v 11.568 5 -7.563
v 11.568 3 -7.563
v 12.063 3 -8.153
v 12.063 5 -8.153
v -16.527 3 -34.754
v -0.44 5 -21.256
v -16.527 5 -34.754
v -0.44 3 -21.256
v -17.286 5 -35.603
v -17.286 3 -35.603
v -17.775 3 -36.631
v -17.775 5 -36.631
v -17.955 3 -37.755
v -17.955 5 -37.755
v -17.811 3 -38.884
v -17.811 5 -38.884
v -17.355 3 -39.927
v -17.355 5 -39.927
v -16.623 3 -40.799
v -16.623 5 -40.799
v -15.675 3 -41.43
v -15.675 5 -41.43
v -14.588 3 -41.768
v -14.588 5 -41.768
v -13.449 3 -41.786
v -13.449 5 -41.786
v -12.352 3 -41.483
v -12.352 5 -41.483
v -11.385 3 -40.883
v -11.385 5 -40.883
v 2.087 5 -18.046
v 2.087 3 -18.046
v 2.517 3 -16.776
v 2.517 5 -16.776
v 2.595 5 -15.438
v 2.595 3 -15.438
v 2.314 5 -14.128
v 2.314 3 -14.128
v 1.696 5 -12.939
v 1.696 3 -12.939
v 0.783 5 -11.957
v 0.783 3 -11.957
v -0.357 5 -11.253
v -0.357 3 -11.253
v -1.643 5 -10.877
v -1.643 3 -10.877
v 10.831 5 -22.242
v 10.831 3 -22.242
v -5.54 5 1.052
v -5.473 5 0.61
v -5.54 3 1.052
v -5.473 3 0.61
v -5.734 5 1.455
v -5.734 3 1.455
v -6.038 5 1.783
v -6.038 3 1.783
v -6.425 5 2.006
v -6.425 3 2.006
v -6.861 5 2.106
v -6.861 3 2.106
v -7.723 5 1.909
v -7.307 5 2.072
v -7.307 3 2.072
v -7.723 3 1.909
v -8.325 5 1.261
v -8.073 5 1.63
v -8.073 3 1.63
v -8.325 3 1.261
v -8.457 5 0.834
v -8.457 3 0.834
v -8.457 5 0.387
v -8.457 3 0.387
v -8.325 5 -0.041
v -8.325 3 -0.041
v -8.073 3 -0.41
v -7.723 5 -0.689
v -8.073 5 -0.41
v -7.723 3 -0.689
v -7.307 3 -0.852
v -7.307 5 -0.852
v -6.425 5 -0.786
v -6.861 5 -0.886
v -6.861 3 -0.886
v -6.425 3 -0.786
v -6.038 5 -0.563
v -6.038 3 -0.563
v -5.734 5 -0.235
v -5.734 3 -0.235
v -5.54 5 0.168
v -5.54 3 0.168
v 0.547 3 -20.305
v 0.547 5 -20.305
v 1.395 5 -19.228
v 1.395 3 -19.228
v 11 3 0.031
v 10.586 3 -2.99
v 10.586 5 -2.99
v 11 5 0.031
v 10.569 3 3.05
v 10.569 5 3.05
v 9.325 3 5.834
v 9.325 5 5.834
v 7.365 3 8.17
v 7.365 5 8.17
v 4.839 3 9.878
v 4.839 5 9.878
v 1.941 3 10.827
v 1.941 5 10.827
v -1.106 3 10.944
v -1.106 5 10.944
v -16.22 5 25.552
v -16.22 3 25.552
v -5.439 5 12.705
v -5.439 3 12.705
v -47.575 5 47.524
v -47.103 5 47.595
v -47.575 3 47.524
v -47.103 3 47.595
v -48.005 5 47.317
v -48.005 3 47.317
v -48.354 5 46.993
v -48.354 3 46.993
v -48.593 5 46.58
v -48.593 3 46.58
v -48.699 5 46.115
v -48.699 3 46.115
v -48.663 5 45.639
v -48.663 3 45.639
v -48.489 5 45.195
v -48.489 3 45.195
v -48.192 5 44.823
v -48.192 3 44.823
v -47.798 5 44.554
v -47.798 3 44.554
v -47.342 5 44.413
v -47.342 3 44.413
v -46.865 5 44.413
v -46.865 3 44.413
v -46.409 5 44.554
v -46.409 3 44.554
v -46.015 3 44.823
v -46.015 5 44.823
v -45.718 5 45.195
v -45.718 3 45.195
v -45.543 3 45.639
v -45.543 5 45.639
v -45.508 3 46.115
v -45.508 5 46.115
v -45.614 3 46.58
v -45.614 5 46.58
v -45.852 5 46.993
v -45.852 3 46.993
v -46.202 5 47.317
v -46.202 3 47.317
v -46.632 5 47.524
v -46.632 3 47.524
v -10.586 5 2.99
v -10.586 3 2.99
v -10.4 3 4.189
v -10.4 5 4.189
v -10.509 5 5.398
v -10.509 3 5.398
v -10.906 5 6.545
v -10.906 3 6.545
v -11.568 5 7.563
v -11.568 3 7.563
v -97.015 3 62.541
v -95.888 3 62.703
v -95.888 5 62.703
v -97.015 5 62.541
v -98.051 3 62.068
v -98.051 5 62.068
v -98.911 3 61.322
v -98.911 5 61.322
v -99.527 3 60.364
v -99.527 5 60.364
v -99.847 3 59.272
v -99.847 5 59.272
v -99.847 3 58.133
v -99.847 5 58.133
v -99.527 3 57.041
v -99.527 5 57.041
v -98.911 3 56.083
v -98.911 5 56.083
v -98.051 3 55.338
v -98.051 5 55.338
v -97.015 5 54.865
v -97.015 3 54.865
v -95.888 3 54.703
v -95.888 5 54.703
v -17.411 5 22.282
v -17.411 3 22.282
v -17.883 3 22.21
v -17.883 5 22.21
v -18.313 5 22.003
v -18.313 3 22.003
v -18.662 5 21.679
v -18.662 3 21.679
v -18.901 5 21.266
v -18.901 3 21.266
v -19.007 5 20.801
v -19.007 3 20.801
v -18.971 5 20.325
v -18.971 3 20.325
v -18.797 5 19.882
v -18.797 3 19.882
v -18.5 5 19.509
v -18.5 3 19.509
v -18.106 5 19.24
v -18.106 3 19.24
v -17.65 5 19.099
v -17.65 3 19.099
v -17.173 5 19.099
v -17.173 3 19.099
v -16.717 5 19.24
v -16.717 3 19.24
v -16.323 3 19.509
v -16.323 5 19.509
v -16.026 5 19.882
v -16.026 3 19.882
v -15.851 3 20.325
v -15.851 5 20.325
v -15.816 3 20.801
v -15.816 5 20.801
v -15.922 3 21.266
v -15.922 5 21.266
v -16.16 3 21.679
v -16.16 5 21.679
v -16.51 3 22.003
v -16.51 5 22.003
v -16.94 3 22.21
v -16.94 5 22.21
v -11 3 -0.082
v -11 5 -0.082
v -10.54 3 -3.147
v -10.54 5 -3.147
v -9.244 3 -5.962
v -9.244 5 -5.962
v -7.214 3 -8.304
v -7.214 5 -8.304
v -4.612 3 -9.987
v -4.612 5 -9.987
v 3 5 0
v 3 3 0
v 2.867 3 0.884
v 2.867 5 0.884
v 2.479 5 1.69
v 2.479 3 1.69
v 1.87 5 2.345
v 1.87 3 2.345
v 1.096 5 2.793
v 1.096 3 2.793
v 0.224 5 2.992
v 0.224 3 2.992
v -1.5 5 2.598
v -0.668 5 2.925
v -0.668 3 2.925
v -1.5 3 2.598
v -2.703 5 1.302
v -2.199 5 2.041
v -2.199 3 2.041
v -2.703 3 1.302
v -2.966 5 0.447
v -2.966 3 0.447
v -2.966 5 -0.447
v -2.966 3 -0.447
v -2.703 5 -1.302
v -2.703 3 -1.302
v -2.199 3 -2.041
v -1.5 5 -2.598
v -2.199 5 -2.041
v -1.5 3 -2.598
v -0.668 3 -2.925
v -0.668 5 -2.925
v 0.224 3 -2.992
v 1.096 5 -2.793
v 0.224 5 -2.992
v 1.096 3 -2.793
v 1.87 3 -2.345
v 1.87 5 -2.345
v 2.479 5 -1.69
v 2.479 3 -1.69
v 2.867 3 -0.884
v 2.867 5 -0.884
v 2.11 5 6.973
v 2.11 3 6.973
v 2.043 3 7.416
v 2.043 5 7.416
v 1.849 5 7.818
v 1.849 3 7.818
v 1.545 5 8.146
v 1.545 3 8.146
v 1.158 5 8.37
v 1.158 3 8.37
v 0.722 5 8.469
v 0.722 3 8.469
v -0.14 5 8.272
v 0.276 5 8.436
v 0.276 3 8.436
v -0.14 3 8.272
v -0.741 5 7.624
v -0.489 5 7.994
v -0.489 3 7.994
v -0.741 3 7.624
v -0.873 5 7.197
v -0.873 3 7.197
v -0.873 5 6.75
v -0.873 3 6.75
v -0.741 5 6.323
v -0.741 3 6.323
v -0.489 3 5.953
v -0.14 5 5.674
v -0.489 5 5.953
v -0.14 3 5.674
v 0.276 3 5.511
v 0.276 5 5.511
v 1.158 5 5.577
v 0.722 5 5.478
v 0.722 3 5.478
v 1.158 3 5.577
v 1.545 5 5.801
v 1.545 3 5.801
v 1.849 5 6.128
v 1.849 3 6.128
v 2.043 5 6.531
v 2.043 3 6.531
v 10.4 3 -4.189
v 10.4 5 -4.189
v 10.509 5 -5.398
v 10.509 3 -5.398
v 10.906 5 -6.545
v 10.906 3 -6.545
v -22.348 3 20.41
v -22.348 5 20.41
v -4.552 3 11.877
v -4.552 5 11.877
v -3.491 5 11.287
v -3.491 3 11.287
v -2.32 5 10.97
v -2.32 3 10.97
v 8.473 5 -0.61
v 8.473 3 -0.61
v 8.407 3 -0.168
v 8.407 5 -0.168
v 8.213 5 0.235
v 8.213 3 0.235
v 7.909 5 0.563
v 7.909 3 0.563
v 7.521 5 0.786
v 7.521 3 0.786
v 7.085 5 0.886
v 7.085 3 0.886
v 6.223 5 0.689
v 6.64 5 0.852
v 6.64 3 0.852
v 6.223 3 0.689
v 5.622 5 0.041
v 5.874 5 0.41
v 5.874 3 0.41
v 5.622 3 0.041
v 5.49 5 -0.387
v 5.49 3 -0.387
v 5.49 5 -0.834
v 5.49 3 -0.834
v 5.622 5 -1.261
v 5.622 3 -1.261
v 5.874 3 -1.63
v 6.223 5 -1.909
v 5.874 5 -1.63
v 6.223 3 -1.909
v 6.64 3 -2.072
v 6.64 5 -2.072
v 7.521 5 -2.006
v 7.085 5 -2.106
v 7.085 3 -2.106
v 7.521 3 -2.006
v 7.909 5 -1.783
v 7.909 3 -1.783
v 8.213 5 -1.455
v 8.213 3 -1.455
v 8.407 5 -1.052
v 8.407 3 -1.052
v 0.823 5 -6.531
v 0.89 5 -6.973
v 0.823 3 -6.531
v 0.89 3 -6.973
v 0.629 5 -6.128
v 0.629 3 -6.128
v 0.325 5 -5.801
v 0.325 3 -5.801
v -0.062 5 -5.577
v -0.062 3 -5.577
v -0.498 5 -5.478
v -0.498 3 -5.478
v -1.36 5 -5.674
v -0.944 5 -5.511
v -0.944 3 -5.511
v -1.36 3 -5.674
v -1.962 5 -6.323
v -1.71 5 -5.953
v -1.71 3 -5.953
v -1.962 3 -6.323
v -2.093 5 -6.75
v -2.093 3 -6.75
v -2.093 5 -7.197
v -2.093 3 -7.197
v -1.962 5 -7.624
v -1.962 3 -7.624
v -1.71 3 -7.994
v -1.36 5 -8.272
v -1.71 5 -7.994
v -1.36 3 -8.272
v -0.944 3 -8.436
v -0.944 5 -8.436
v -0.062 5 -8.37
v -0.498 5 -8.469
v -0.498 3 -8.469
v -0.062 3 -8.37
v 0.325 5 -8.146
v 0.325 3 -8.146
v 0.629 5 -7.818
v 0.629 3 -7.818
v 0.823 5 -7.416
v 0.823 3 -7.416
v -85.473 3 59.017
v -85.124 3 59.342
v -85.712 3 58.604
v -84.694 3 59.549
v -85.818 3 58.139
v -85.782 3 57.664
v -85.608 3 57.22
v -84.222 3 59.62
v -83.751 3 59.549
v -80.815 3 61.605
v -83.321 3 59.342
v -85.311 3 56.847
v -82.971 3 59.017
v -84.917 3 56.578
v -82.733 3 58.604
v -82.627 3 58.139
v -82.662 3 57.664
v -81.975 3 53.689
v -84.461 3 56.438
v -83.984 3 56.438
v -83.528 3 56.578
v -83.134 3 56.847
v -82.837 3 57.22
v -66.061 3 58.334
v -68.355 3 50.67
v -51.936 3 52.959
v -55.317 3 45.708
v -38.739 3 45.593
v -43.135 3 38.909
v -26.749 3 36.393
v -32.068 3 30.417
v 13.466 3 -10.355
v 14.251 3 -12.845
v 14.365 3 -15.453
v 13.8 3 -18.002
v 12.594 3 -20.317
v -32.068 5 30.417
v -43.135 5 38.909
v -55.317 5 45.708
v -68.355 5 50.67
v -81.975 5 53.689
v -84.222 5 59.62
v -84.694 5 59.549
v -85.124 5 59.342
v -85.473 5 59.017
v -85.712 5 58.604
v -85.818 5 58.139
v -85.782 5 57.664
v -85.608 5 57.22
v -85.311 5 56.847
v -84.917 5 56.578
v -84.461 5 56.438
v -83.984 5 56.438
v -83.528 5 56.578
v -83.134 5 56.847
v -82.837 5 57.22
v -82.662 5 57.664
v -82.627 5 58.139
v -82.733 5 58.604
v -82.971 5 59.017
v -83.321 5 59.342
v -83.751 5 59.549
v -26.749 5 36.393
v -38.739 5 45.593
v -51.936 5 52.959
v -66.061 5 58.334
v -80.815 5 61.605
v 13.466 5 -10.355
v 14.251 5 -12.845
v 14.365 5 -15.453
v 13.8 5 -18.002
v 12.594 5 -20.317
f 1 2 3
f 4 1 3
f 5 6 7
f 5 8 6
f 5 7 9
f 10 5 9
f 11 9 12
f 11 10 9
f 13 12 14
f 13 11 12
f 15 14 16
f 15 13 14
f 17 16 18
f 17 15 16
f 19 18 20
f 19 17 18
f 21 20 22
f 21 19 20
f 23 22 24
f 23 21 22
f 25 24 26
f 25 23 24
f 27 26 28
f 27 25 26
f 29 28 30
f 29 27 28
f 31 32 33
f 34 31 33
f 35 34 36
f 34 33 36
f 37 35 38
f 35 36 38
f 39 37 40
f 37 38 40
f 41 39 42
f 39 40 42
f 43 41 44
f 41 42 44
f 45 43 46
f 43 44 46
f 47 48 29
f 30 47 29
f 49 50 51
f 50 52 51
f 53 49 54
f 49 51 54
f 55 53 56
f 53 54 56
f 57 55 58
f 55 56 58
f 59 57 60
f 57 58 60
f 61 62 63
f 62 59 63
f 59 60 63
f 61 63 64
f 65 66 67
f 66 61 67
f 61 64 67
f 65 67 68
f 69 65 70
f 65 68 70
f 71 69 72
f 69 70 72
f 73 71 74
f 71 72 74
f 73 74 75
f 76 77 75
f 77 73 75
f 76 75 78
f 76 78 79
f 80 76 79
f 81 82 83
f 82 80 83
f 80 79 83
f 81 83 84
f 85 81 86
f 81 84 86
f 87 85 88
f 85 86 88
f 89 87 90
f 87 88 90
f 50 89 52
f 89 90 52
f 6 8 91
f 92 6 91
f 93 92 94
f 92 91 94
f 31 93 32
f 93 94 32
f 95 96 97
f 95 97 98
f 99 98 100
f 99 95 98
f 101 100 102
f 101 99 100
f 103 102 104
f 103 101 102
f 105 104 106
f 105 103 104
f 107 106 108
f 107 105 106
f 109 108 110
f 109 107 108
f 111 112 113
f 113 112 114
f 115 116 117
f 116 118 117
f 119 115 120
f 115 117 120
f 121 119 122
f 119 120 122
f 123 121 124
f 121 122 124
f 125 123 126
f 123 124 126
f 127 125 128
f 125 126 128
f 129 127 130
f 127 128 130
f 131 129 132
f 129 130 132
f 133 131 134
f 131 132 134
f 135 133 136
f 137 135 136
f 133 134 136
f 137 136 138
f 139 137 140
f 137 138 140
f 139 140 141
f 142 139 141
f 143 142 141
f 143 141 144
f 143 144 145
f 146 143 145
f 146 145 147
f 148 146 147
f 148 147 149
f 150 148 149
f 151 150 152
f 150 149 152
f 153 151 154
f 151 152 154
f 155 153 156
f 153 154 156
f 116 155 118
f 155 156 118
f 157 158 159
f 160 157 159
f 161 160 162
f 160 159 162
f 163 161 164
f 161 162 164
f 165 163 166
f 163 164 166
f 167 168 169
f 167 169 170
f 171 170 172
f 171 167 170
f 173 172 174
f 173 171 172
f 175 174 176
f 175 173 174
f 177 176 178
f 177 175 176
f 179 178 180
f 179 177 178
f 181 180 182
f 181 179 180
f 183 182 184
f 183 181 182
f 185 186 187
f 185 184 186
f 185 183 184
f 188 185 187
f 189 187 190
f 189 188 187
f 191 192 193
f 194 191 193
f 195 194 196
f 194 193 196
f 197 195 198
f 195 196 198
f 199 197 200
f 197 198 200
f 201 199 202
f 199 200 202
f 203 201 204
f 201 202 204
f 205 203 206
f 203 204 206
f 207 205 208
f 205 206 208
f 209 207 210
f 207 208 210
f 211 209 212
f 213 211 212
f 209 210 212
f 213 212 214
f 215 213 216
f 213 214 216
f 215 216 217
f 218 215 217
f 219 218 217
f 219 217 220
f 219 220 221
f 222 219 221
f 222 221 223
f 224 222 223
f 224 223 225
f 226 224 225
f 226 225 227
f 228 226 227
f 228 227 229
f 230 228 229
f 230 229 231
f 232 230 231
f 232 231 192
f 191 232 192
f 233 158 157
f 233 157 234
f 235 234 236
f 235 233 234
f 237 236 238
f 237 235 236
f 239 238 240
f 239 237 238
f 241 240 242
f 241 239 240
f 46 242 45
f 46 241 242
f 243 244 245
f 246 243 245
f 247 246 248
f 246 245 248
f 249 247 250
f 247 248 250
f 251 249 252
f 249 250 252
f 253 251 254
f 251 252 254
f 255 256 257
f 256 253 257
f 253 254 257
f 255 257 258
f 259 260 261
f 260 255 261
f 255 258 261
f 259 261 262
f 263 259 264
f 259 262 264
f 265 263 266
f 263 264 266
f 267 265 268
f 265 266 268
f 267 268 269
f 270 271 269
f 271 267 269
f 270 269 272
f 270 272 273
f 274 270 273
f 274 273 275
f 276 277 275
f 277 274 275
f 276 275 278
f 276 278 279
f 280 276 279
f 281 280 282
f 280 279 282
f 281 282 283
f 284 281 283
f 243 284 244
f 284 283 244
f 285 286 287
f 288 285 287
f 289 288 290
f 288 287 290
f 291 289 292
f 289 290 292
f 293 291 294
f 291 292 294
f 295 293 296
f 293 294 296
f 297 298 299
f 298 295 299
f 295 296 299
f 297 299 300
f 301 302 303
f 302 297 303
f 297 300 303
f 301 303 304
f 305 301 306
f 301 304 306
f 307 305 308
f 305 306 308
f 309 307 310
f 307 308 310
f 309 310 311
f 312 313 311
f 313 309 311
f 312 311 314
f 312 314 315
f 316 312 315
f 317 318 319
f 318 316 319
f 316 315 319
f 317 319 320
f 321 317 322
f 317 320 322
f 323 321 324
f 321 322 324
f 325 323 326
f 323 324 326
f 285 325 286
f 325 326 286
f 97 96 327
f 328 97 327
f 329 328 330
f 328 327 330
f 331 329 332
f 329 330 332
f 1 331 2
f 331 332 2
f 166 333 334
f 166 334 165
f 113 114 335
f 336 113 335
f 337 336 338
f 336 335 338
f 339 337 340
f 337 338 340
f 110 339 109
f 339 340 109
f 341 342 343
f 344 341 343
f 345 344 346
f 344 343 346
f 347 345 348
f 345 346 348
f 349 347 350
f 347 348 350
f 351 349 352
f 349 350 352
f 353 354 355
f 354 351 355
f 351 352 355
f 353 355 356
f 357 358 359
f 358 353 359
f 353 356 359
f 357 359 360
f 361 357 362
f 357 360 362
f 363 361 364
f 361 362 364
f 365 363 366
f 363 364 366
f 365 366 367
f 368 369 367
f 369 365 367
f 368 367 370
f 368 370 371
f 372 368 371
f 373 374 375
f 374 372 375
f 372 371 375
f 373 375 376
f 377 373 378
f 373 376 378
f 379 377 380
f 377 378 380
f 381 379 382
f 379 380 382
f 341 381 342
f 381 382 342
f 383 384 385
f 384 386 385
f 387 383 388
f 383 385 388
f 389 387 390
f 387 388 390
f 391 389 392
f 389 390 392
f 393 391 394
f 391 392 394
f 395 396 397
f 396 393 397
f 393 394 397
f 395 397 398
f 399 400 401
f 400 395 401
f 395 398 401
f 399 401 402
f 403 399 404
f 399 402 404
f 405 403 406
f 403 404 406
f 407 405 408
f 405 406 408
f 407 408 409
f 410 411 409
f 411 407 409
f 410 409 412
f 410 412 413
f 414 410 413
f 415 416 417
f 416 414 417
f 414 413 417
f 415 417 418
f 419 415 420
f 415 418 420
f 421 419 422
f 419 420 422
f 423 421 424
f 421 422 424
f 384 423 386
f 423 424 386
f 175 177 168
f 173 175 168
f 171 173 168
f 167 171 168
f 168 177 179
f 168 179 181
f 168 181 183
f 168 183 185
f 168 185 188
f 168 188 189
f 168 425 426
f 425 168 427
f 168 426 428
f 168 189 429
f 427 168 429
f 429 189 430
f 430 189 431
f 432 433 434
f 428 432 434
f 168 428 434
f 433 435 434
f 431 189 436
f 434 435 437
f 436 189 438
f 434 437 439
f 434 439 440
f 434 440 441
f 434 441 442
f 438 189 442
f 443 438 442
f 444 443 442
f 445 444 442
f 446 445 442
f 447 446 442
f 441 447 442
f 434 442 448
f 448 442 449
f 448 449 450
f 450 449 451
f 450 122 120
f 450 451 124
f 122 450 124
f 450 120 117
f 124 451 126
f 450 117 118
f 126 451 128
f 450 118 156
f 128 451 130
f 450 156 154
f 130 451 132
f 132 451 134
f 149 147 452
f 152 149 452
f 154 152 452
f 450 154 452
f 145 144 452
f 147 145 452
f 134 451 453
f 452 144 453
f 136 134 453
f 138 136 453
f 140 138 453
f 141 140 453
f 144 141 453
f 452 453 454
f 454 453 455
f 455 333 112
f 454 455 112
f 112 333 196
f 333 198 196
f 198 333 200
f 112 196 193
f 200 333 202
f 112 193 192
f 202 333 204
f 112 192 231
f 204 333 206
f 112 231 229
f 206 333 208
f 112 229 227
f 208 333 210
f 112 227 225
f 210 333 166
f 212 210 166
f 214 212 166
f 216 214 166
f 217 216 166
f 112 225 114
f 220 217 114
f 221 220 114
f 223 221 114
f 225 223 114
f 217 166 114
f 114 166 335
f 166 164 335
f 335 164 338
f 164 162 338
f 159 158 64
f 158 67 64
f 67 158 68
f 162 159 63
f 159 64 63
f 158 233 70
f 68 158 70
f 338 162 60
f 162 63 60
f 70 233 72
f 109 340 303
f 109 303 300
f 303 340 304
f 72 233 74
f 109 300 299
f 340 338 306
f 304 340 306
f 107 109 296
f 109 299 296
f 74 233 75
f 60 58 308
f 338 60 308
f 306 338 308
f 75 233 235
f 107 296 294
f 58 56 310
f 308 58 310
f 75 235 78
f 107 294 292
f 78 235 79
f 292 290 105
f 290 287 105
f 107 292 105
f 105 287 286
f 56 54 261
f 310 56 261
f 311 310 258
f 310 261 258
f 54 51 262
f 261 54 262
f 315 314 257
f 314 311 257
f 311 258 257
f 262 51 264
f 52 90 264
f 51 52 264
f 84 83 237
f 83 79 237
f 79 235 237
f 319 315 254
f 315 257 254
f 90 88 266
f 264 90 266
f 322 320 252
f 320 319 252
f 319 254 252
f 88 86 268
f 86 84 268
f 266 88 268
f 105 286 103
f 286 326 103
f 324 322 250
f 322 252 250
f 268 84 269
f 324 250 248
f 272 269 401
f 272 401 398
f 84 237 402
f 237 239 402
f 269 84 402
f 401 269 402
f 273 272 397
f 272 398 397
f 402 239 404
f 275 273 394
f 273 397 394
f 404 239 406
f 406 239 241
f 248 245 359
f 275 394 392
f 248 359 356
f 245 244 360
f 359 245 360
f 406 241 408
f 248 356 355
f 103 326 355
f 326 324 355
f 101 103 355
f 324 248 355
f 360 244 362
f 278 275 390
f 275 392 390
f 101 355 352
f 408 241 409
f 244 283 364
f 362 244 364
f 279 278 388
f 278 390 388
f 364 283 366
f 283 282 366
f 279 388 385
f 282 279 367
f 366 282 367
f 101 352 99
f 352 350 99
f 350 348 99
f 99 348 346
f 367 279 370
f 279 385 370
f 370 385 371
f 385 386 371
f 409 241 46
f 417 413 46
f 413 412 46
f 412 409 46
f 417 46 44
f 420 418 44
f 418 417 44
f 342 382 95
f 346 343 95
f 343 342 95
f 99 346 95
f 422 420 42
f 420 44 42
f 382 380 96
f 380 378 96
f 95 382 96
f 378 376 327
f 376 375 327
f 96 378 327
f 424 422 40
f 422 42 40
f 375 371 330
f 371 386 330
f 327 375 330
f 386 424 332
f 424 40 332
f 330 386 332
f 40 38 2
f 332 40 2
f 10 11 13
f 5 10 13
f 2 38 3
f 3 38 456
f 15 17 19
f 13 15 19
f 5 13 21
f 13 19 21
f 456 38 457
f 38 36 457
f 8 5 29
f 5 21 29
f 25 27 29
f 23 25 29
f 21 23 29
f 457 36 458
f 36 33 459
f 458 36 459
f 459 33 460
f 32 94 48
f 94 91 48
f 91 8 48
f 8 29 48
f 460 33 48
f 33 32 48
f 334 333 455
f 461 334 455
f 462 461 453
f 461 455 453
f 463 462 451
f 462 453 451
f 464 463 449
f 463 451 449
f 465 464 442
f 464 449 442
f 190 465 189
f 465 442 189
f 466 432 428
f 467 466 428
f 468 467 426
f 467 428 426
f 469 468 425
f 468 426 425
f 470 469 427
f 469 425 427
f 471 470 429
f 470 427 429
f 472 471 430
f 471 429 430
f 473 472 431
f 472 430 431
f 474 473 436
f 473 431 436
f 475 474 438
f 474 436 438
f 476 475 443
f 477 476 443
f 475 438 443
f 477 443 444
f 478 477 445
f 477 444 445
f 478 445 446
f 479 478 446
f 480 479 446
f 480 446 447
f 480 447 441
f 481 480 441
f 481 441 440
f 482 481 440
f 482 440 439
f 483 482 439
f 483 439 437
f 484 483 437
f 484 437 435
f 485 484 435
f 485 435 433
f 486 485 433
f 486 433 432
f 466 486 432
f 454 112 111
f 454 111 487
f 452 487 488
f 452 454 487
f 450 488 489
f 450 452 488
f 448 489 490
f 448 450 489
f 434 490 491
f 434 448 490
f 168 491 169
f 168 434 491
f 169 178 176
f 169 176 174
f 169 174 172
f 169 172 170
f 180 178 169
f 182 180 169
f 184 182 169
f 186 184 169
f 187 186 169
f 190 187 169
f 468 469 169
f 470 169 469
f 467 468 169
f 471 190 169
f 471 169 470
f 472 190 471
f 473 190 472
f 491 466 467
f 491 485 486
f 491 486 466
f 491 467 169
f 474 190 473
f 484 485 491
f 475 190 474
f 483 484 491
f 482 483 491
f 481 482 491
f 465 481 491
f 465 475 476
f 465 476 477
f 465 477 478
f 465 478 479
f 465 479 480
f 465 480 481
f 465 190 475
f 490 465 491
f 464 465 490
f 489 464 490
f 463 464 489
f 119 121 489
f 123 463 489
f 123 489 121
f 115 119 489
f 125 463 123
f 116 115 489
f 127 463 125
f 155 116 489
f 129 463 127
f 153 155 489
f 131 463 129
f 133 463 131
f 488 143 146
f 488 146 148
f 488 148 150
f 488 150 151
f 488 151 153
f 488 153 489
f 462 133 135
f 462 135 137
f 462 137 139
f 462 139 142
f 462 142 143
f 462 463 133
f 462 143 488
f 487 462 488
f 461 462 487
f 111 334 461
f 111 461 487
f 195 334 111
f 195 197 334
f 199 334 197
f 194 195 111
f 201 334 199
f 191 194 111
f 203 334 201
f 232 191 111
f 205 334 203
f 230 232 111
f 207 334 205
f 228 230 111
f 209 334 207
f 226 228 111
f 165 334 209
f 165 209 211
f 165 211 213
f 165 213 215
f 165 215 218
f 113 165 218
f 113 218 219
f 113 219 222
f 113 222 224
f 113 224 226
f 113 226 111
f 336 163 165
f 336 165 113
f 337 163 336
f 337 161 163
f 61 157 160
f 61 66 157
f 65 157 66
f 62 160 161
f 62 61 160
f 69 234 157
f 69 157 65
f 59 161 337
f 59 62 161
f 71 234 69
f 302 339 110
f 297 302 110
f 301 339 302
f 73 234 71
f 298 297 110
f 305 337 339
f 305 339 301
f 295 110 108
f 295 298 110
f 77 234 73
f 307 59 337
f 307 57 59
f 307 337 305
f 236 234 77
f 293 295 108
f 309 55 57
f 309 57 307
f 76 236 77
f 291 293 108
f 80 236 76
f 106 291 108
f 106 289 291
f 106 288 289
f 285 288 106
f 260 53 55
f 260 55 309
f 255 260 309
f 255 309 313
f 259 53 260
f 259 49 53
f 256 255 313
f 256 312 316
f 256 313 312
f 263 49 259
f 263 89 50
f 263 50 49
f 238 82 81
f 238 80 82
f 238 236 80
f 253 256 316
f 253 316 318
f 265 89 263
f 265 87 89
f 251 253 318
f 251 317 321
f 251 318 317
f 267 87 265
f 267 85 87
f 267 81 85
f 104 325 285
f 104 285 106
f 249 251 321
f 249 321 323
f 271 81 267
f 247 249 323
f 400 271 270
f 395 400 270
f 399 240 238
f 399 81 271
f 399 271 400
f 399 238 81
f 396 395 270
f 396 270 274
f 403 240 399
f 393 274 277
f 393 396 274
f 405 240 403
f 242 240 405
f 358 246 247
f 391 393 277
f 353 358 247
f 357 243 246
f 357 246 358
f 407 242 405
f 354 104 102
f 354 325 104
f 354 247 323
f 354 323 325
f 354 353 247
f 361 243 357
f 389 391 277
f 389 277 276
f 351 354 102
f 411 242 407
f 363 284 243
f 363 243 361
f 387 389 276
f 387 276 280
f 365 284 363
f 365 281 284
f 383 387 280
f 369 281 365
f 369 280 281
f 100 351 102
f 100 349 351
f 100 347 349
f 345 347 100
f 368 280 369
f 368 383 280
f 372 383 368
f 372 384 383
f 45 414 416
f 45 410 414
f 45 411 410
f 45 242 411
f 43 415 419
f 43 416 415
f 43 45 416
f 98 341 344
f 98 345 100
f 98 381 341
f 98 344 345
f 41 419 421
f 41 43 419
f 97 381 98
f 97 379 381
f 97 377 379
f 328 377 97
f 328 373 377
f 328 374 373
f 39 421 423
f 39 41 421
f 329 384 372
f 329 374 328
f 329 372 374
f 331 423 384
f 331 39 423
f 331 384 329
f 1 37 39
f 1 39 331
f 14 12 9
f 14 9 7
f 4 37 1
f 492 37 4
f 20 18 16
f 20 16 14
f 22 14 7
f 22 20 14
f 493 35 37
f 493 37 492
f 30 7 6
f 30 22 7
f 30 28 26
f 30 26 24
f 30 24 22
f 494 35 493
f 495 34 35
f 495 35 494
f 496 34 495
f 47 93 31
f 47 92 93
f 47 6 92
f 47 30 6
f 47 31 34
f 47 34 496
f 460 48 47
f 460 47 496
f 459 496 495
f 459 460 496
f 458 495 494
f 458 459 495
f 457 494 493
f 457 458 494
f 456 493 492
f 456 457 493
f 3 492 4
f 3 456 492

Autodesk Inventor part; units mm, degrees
ref_plane "YZ Plane" through (0, 0, 0) normal (1, 0, 0) x (0, 1, 0)
ref_plane "XZ Plane" through (0, 0, 0) normal (0, 1, 0) x (-1, 0, 0)
ref_plane "XY Plane" through (0, 0, 0) normal (0, 0, 1) x (1, 0, 0)
ref_plane "Work Plane5" through (0, 3, 0) normal (0, 1, 0) x (1, 0, 0)
sketch "Sketch2" plane through (0, 3, 0) normal (0, 1, 0) x (1, 0, 0)
  line L0 (0, 0) -> (-19.2836, -22.9813) construction
  line L1 (5.1953, 21.7488) -> (-13.9558, 37.8185) construction
  arc A0 (-95.8881, -58.7026) -> (-19.2836, -22.9813) centre (-95.8881, 41.2974) ccw construction
  line L2 (-19.2836, -22.9813) -> (-95.8881, 41.2974) construction
  line L3 (-95.8881, 41.2974) -> (-95.8881, -58.7026) construction
  line L4 (0, 0) -> (0, -11) construction
  line L5 (6.4279, 7.6604) -> (0, 0) construction
  arc A1 (6.4279, 7.6604) -> (5.1953, 21.7488) centre (-1.2326, 14.0883) ccw construction
  arc A2 (-95.8881, -54.7026) -> (-95.8881, -62.7026) centre (-95.8881, -58.7026) ccw
  arc A3 (-95.8881, -62.7026) -> (-16.2195, -25.5525) centre (-95.8881, 41.2974) ccw
  arc A4 (-95.8881, -54.7026) -> (-22.3478, -20.4102) centre (-95.8881, 41.2974) ccw
  line L6 (-19.2836, -22.9813) -> (-22.3478, -20.4102) construction
  line L7 (-19.2836, -22.9813) -> (-16.2195, -25.5525) construction
  line L8 (10.8306, 22.2418) -> (-11.3847, 40.8826)
  arc A5 (-11.3847, 40.8826) -> (-16.527, 34.7543) centre (-13.9558, 37.8185) ccw
  line L9 (-0.44, 21.2557) -> (-16.527, 34.7543)
  arc A6 (2.0873, 18.0456) -> (-0.44, 21.2557) centre (-6.8679, 13.5953) ccw
  arc A7 (12.0632, 8.1535) -> (10.8306, 22.2418) centre (4.4028, 14.5813) ccw
  circle A8 centre (0, 0) radius 7 construction
  arc A9 (-1.1061, -10.9442) -> (10.5859, 2.9897) centre (0, 0) ccw
  arc A10 (-1.6433, 10.8766) -> (-10.5859, -2.9897) centre (0, 0) ccw
  line L10 (-16.2195, -25.5525) -> (-5.4391, -12.705)
  line L11 (11.5675, 7.5627) -> (12.0632, 8.1535)
  line L12 (-22.3478, -20.4102) -> (-11.5675, -7.5627)
  arc A11 (-1.1061, -10.9442) -> (-5.4391, -12.705) centre (-1.6089, -15.9189) ccw
  arc A12 (11.5675, 7.5627) -> (10.5859, 2.9897) centre (15.3977, 4.3487) ccw
  arc A13 (-11.5675, -7.5627) -> (-10.5859, -2.9897) centre (-15.3977, -4.3487) ccw
  arc A14 (-1.6433, 10.8766) -> (2.0873, 18.0456) centre (-2.3903, 15.8204) ccw
  circle A15 centre (0, 0) radius 3
  circle A16 centre (-6.9734, -0.6101) radius 1.5
  line L13 (0, 0) -> (-6.9734, -0.6101) construction
  circle A17 centre (0.6101, -6.9734) radius 1.5
  circle A18 centre (6.9734, 0.6101) radius 1.5
  circle A19 centre (-0.6101, 6.9734) radius 1.5
  point P0 (12.8558, 15.3209)
  point P1 (-3.5224, -10.4208)
  point P2 (9.6508, 5.2785)
  dimension "d53" = 14
  dimension "d24" = 30
  dimension "d27" = 35
  dimension "d28" = 20
  dimension "d29" = 100
  dimension "d30" = 50
  dimension "d41" = 10
  dimension "d42" = 140
  dimension "d50" = 8
  dimension "d51" = 4
  dimension "d52" = 10
  dimension "d55" = 11
  dimension "d56" = 11
  dimension "d57" = 5
  dimension "d58" = 6
  dimension "d62" = 3
  dimension "d63" = 45
  dimension "d66" = 360
extrude "Extrusion2" add sketch "Sketch2" along normal blind 2
sketch "Sketch4" plane through (0, 5, 0) normal (0, 1, 0) x (1, 0, 0)
  arc A0 (-95.8881, -54.7026) -> (-22.3478, -20.4102) centre (-95.8881, 41.2974) ccw construction
  arc A1 (-84.2223, -58.0198) -> (-17.4113, -20.6815) centre (-95.8881, 41.2974) ccw construction
  line L0 (-84.2223, -58.0198) -> (-95.8881, 41.2974) construction
  line L1 (-95.8881, 41.2974) -> (-17.4113, -20.6815) construction
  circle A2 centre (0, 0) radius 3 construction
  line L2 (-95.8881, 41.2974) -> (0, 0) construction
  point P0 (-47.1033, -45.9954)
  dimension "d68" = 4
  dimension "d69" = 45
  dimension "d70" = 15
hole "Hole1" at (-84.2223, 5, 58.0198) at (-47.1033, 5, 45.9954) at (-17.4113, 5, 20.6815) direction (0, -1, 0) diameter 3.2 end through all
sketch "Sketch5" plane through (0, 5, 0) normal (0, 1, 0) x (1, 0, 0)
  circle A0 centre (-47.1033, -45.9954) radius 1.6 projected
  circle A1 centre (-84.2223, -58.0198) radius 1.6 projected
  circle A2 centre (-17.4113, -20.6815) radius 1.6 projected
  circle A3 centre (0, 0) radius 3 projected
  circle A4 centre (-0.6101, 6.9734) radius 1.5 projected
  circle A5 centre (6.9734, 0.6101) radius 1.5 projected
  circle A6 centre (0.6101, -6.9734) radius 1.5 projected
  circle A7 centre (-6.9734, -0.6101) radius 1.5 projected
  arc A8 (-95.8881, -62.7026) -> (-16.2195, -25.5525) centre (-95.8881, 41.2974) ccw projected
  line L0 (-16.2195, -25.5525) -> (-5.4391, -12.705) projected
  arc A9 (-1.1061, -10.9442) -> (-5.4391, -12.705) centre (-1.6089, -15.9189) ccw projected
  arc A10 (-1.1061, -10.9442) -> (10.5859, 2.9897) centre (0, 0) ccw projected
  arc A11 (11.5675, 7.5627) -> (10.5859, 2.9897) centre (15.3977, 4.3487) ccw projected
  line L1 (11.5675, 7.5627) -> (12.0632, 8.1535) projected
  arc A12 (12.0632, 8.1535) -> (10.8306, 22.2418) centre (4.4028, 14.5813) ccw projected
  line L2 (10.8306, 22.2418) -> (-11.3847, 40.8826) projected
  arc A13 (-11.3847, 40.8826) -> (-16.527, 34.7543) centre (-13.9558, 37.8185) ccw projected
  line L3 (-16.527, 34.7543) -> (-0.44, 21.2557) projected
  arc A14 (2.0873, 18.0456) -> (-0.44, 21.2557) centre (-6.8679, 13.5953) ccw projected
  arc A15 (-1.6433, 10.8766) -> (2.0873, 18.0456) centre (-2.3903, 15.8204) ccw projected
  arc A16 (-1.6433, 10.8766) -> (-10.5859, -2.9897) centre (0, 0) ccw projected
  arc A17 (-11.5675, -7.5627) -> (-10.5859, -2.9897) centre (-15.3977, -4.3487) ccw projected
  line L4 (-11.5675, -7.5627) -> (-22.3478, -20.4102) projected
  arc A18 (-95.8881, -54.7026) -> (-22.3478, -20.4102) centre (-95.8881, 41.2974) ccw projected
  arc A19 (-95.8881, -54.7026) -> (-95.8881, -62.7026) centre (-95.8881, -58.7026) ccw projected
properties part number "wstepna_geometria_wersja_2"
